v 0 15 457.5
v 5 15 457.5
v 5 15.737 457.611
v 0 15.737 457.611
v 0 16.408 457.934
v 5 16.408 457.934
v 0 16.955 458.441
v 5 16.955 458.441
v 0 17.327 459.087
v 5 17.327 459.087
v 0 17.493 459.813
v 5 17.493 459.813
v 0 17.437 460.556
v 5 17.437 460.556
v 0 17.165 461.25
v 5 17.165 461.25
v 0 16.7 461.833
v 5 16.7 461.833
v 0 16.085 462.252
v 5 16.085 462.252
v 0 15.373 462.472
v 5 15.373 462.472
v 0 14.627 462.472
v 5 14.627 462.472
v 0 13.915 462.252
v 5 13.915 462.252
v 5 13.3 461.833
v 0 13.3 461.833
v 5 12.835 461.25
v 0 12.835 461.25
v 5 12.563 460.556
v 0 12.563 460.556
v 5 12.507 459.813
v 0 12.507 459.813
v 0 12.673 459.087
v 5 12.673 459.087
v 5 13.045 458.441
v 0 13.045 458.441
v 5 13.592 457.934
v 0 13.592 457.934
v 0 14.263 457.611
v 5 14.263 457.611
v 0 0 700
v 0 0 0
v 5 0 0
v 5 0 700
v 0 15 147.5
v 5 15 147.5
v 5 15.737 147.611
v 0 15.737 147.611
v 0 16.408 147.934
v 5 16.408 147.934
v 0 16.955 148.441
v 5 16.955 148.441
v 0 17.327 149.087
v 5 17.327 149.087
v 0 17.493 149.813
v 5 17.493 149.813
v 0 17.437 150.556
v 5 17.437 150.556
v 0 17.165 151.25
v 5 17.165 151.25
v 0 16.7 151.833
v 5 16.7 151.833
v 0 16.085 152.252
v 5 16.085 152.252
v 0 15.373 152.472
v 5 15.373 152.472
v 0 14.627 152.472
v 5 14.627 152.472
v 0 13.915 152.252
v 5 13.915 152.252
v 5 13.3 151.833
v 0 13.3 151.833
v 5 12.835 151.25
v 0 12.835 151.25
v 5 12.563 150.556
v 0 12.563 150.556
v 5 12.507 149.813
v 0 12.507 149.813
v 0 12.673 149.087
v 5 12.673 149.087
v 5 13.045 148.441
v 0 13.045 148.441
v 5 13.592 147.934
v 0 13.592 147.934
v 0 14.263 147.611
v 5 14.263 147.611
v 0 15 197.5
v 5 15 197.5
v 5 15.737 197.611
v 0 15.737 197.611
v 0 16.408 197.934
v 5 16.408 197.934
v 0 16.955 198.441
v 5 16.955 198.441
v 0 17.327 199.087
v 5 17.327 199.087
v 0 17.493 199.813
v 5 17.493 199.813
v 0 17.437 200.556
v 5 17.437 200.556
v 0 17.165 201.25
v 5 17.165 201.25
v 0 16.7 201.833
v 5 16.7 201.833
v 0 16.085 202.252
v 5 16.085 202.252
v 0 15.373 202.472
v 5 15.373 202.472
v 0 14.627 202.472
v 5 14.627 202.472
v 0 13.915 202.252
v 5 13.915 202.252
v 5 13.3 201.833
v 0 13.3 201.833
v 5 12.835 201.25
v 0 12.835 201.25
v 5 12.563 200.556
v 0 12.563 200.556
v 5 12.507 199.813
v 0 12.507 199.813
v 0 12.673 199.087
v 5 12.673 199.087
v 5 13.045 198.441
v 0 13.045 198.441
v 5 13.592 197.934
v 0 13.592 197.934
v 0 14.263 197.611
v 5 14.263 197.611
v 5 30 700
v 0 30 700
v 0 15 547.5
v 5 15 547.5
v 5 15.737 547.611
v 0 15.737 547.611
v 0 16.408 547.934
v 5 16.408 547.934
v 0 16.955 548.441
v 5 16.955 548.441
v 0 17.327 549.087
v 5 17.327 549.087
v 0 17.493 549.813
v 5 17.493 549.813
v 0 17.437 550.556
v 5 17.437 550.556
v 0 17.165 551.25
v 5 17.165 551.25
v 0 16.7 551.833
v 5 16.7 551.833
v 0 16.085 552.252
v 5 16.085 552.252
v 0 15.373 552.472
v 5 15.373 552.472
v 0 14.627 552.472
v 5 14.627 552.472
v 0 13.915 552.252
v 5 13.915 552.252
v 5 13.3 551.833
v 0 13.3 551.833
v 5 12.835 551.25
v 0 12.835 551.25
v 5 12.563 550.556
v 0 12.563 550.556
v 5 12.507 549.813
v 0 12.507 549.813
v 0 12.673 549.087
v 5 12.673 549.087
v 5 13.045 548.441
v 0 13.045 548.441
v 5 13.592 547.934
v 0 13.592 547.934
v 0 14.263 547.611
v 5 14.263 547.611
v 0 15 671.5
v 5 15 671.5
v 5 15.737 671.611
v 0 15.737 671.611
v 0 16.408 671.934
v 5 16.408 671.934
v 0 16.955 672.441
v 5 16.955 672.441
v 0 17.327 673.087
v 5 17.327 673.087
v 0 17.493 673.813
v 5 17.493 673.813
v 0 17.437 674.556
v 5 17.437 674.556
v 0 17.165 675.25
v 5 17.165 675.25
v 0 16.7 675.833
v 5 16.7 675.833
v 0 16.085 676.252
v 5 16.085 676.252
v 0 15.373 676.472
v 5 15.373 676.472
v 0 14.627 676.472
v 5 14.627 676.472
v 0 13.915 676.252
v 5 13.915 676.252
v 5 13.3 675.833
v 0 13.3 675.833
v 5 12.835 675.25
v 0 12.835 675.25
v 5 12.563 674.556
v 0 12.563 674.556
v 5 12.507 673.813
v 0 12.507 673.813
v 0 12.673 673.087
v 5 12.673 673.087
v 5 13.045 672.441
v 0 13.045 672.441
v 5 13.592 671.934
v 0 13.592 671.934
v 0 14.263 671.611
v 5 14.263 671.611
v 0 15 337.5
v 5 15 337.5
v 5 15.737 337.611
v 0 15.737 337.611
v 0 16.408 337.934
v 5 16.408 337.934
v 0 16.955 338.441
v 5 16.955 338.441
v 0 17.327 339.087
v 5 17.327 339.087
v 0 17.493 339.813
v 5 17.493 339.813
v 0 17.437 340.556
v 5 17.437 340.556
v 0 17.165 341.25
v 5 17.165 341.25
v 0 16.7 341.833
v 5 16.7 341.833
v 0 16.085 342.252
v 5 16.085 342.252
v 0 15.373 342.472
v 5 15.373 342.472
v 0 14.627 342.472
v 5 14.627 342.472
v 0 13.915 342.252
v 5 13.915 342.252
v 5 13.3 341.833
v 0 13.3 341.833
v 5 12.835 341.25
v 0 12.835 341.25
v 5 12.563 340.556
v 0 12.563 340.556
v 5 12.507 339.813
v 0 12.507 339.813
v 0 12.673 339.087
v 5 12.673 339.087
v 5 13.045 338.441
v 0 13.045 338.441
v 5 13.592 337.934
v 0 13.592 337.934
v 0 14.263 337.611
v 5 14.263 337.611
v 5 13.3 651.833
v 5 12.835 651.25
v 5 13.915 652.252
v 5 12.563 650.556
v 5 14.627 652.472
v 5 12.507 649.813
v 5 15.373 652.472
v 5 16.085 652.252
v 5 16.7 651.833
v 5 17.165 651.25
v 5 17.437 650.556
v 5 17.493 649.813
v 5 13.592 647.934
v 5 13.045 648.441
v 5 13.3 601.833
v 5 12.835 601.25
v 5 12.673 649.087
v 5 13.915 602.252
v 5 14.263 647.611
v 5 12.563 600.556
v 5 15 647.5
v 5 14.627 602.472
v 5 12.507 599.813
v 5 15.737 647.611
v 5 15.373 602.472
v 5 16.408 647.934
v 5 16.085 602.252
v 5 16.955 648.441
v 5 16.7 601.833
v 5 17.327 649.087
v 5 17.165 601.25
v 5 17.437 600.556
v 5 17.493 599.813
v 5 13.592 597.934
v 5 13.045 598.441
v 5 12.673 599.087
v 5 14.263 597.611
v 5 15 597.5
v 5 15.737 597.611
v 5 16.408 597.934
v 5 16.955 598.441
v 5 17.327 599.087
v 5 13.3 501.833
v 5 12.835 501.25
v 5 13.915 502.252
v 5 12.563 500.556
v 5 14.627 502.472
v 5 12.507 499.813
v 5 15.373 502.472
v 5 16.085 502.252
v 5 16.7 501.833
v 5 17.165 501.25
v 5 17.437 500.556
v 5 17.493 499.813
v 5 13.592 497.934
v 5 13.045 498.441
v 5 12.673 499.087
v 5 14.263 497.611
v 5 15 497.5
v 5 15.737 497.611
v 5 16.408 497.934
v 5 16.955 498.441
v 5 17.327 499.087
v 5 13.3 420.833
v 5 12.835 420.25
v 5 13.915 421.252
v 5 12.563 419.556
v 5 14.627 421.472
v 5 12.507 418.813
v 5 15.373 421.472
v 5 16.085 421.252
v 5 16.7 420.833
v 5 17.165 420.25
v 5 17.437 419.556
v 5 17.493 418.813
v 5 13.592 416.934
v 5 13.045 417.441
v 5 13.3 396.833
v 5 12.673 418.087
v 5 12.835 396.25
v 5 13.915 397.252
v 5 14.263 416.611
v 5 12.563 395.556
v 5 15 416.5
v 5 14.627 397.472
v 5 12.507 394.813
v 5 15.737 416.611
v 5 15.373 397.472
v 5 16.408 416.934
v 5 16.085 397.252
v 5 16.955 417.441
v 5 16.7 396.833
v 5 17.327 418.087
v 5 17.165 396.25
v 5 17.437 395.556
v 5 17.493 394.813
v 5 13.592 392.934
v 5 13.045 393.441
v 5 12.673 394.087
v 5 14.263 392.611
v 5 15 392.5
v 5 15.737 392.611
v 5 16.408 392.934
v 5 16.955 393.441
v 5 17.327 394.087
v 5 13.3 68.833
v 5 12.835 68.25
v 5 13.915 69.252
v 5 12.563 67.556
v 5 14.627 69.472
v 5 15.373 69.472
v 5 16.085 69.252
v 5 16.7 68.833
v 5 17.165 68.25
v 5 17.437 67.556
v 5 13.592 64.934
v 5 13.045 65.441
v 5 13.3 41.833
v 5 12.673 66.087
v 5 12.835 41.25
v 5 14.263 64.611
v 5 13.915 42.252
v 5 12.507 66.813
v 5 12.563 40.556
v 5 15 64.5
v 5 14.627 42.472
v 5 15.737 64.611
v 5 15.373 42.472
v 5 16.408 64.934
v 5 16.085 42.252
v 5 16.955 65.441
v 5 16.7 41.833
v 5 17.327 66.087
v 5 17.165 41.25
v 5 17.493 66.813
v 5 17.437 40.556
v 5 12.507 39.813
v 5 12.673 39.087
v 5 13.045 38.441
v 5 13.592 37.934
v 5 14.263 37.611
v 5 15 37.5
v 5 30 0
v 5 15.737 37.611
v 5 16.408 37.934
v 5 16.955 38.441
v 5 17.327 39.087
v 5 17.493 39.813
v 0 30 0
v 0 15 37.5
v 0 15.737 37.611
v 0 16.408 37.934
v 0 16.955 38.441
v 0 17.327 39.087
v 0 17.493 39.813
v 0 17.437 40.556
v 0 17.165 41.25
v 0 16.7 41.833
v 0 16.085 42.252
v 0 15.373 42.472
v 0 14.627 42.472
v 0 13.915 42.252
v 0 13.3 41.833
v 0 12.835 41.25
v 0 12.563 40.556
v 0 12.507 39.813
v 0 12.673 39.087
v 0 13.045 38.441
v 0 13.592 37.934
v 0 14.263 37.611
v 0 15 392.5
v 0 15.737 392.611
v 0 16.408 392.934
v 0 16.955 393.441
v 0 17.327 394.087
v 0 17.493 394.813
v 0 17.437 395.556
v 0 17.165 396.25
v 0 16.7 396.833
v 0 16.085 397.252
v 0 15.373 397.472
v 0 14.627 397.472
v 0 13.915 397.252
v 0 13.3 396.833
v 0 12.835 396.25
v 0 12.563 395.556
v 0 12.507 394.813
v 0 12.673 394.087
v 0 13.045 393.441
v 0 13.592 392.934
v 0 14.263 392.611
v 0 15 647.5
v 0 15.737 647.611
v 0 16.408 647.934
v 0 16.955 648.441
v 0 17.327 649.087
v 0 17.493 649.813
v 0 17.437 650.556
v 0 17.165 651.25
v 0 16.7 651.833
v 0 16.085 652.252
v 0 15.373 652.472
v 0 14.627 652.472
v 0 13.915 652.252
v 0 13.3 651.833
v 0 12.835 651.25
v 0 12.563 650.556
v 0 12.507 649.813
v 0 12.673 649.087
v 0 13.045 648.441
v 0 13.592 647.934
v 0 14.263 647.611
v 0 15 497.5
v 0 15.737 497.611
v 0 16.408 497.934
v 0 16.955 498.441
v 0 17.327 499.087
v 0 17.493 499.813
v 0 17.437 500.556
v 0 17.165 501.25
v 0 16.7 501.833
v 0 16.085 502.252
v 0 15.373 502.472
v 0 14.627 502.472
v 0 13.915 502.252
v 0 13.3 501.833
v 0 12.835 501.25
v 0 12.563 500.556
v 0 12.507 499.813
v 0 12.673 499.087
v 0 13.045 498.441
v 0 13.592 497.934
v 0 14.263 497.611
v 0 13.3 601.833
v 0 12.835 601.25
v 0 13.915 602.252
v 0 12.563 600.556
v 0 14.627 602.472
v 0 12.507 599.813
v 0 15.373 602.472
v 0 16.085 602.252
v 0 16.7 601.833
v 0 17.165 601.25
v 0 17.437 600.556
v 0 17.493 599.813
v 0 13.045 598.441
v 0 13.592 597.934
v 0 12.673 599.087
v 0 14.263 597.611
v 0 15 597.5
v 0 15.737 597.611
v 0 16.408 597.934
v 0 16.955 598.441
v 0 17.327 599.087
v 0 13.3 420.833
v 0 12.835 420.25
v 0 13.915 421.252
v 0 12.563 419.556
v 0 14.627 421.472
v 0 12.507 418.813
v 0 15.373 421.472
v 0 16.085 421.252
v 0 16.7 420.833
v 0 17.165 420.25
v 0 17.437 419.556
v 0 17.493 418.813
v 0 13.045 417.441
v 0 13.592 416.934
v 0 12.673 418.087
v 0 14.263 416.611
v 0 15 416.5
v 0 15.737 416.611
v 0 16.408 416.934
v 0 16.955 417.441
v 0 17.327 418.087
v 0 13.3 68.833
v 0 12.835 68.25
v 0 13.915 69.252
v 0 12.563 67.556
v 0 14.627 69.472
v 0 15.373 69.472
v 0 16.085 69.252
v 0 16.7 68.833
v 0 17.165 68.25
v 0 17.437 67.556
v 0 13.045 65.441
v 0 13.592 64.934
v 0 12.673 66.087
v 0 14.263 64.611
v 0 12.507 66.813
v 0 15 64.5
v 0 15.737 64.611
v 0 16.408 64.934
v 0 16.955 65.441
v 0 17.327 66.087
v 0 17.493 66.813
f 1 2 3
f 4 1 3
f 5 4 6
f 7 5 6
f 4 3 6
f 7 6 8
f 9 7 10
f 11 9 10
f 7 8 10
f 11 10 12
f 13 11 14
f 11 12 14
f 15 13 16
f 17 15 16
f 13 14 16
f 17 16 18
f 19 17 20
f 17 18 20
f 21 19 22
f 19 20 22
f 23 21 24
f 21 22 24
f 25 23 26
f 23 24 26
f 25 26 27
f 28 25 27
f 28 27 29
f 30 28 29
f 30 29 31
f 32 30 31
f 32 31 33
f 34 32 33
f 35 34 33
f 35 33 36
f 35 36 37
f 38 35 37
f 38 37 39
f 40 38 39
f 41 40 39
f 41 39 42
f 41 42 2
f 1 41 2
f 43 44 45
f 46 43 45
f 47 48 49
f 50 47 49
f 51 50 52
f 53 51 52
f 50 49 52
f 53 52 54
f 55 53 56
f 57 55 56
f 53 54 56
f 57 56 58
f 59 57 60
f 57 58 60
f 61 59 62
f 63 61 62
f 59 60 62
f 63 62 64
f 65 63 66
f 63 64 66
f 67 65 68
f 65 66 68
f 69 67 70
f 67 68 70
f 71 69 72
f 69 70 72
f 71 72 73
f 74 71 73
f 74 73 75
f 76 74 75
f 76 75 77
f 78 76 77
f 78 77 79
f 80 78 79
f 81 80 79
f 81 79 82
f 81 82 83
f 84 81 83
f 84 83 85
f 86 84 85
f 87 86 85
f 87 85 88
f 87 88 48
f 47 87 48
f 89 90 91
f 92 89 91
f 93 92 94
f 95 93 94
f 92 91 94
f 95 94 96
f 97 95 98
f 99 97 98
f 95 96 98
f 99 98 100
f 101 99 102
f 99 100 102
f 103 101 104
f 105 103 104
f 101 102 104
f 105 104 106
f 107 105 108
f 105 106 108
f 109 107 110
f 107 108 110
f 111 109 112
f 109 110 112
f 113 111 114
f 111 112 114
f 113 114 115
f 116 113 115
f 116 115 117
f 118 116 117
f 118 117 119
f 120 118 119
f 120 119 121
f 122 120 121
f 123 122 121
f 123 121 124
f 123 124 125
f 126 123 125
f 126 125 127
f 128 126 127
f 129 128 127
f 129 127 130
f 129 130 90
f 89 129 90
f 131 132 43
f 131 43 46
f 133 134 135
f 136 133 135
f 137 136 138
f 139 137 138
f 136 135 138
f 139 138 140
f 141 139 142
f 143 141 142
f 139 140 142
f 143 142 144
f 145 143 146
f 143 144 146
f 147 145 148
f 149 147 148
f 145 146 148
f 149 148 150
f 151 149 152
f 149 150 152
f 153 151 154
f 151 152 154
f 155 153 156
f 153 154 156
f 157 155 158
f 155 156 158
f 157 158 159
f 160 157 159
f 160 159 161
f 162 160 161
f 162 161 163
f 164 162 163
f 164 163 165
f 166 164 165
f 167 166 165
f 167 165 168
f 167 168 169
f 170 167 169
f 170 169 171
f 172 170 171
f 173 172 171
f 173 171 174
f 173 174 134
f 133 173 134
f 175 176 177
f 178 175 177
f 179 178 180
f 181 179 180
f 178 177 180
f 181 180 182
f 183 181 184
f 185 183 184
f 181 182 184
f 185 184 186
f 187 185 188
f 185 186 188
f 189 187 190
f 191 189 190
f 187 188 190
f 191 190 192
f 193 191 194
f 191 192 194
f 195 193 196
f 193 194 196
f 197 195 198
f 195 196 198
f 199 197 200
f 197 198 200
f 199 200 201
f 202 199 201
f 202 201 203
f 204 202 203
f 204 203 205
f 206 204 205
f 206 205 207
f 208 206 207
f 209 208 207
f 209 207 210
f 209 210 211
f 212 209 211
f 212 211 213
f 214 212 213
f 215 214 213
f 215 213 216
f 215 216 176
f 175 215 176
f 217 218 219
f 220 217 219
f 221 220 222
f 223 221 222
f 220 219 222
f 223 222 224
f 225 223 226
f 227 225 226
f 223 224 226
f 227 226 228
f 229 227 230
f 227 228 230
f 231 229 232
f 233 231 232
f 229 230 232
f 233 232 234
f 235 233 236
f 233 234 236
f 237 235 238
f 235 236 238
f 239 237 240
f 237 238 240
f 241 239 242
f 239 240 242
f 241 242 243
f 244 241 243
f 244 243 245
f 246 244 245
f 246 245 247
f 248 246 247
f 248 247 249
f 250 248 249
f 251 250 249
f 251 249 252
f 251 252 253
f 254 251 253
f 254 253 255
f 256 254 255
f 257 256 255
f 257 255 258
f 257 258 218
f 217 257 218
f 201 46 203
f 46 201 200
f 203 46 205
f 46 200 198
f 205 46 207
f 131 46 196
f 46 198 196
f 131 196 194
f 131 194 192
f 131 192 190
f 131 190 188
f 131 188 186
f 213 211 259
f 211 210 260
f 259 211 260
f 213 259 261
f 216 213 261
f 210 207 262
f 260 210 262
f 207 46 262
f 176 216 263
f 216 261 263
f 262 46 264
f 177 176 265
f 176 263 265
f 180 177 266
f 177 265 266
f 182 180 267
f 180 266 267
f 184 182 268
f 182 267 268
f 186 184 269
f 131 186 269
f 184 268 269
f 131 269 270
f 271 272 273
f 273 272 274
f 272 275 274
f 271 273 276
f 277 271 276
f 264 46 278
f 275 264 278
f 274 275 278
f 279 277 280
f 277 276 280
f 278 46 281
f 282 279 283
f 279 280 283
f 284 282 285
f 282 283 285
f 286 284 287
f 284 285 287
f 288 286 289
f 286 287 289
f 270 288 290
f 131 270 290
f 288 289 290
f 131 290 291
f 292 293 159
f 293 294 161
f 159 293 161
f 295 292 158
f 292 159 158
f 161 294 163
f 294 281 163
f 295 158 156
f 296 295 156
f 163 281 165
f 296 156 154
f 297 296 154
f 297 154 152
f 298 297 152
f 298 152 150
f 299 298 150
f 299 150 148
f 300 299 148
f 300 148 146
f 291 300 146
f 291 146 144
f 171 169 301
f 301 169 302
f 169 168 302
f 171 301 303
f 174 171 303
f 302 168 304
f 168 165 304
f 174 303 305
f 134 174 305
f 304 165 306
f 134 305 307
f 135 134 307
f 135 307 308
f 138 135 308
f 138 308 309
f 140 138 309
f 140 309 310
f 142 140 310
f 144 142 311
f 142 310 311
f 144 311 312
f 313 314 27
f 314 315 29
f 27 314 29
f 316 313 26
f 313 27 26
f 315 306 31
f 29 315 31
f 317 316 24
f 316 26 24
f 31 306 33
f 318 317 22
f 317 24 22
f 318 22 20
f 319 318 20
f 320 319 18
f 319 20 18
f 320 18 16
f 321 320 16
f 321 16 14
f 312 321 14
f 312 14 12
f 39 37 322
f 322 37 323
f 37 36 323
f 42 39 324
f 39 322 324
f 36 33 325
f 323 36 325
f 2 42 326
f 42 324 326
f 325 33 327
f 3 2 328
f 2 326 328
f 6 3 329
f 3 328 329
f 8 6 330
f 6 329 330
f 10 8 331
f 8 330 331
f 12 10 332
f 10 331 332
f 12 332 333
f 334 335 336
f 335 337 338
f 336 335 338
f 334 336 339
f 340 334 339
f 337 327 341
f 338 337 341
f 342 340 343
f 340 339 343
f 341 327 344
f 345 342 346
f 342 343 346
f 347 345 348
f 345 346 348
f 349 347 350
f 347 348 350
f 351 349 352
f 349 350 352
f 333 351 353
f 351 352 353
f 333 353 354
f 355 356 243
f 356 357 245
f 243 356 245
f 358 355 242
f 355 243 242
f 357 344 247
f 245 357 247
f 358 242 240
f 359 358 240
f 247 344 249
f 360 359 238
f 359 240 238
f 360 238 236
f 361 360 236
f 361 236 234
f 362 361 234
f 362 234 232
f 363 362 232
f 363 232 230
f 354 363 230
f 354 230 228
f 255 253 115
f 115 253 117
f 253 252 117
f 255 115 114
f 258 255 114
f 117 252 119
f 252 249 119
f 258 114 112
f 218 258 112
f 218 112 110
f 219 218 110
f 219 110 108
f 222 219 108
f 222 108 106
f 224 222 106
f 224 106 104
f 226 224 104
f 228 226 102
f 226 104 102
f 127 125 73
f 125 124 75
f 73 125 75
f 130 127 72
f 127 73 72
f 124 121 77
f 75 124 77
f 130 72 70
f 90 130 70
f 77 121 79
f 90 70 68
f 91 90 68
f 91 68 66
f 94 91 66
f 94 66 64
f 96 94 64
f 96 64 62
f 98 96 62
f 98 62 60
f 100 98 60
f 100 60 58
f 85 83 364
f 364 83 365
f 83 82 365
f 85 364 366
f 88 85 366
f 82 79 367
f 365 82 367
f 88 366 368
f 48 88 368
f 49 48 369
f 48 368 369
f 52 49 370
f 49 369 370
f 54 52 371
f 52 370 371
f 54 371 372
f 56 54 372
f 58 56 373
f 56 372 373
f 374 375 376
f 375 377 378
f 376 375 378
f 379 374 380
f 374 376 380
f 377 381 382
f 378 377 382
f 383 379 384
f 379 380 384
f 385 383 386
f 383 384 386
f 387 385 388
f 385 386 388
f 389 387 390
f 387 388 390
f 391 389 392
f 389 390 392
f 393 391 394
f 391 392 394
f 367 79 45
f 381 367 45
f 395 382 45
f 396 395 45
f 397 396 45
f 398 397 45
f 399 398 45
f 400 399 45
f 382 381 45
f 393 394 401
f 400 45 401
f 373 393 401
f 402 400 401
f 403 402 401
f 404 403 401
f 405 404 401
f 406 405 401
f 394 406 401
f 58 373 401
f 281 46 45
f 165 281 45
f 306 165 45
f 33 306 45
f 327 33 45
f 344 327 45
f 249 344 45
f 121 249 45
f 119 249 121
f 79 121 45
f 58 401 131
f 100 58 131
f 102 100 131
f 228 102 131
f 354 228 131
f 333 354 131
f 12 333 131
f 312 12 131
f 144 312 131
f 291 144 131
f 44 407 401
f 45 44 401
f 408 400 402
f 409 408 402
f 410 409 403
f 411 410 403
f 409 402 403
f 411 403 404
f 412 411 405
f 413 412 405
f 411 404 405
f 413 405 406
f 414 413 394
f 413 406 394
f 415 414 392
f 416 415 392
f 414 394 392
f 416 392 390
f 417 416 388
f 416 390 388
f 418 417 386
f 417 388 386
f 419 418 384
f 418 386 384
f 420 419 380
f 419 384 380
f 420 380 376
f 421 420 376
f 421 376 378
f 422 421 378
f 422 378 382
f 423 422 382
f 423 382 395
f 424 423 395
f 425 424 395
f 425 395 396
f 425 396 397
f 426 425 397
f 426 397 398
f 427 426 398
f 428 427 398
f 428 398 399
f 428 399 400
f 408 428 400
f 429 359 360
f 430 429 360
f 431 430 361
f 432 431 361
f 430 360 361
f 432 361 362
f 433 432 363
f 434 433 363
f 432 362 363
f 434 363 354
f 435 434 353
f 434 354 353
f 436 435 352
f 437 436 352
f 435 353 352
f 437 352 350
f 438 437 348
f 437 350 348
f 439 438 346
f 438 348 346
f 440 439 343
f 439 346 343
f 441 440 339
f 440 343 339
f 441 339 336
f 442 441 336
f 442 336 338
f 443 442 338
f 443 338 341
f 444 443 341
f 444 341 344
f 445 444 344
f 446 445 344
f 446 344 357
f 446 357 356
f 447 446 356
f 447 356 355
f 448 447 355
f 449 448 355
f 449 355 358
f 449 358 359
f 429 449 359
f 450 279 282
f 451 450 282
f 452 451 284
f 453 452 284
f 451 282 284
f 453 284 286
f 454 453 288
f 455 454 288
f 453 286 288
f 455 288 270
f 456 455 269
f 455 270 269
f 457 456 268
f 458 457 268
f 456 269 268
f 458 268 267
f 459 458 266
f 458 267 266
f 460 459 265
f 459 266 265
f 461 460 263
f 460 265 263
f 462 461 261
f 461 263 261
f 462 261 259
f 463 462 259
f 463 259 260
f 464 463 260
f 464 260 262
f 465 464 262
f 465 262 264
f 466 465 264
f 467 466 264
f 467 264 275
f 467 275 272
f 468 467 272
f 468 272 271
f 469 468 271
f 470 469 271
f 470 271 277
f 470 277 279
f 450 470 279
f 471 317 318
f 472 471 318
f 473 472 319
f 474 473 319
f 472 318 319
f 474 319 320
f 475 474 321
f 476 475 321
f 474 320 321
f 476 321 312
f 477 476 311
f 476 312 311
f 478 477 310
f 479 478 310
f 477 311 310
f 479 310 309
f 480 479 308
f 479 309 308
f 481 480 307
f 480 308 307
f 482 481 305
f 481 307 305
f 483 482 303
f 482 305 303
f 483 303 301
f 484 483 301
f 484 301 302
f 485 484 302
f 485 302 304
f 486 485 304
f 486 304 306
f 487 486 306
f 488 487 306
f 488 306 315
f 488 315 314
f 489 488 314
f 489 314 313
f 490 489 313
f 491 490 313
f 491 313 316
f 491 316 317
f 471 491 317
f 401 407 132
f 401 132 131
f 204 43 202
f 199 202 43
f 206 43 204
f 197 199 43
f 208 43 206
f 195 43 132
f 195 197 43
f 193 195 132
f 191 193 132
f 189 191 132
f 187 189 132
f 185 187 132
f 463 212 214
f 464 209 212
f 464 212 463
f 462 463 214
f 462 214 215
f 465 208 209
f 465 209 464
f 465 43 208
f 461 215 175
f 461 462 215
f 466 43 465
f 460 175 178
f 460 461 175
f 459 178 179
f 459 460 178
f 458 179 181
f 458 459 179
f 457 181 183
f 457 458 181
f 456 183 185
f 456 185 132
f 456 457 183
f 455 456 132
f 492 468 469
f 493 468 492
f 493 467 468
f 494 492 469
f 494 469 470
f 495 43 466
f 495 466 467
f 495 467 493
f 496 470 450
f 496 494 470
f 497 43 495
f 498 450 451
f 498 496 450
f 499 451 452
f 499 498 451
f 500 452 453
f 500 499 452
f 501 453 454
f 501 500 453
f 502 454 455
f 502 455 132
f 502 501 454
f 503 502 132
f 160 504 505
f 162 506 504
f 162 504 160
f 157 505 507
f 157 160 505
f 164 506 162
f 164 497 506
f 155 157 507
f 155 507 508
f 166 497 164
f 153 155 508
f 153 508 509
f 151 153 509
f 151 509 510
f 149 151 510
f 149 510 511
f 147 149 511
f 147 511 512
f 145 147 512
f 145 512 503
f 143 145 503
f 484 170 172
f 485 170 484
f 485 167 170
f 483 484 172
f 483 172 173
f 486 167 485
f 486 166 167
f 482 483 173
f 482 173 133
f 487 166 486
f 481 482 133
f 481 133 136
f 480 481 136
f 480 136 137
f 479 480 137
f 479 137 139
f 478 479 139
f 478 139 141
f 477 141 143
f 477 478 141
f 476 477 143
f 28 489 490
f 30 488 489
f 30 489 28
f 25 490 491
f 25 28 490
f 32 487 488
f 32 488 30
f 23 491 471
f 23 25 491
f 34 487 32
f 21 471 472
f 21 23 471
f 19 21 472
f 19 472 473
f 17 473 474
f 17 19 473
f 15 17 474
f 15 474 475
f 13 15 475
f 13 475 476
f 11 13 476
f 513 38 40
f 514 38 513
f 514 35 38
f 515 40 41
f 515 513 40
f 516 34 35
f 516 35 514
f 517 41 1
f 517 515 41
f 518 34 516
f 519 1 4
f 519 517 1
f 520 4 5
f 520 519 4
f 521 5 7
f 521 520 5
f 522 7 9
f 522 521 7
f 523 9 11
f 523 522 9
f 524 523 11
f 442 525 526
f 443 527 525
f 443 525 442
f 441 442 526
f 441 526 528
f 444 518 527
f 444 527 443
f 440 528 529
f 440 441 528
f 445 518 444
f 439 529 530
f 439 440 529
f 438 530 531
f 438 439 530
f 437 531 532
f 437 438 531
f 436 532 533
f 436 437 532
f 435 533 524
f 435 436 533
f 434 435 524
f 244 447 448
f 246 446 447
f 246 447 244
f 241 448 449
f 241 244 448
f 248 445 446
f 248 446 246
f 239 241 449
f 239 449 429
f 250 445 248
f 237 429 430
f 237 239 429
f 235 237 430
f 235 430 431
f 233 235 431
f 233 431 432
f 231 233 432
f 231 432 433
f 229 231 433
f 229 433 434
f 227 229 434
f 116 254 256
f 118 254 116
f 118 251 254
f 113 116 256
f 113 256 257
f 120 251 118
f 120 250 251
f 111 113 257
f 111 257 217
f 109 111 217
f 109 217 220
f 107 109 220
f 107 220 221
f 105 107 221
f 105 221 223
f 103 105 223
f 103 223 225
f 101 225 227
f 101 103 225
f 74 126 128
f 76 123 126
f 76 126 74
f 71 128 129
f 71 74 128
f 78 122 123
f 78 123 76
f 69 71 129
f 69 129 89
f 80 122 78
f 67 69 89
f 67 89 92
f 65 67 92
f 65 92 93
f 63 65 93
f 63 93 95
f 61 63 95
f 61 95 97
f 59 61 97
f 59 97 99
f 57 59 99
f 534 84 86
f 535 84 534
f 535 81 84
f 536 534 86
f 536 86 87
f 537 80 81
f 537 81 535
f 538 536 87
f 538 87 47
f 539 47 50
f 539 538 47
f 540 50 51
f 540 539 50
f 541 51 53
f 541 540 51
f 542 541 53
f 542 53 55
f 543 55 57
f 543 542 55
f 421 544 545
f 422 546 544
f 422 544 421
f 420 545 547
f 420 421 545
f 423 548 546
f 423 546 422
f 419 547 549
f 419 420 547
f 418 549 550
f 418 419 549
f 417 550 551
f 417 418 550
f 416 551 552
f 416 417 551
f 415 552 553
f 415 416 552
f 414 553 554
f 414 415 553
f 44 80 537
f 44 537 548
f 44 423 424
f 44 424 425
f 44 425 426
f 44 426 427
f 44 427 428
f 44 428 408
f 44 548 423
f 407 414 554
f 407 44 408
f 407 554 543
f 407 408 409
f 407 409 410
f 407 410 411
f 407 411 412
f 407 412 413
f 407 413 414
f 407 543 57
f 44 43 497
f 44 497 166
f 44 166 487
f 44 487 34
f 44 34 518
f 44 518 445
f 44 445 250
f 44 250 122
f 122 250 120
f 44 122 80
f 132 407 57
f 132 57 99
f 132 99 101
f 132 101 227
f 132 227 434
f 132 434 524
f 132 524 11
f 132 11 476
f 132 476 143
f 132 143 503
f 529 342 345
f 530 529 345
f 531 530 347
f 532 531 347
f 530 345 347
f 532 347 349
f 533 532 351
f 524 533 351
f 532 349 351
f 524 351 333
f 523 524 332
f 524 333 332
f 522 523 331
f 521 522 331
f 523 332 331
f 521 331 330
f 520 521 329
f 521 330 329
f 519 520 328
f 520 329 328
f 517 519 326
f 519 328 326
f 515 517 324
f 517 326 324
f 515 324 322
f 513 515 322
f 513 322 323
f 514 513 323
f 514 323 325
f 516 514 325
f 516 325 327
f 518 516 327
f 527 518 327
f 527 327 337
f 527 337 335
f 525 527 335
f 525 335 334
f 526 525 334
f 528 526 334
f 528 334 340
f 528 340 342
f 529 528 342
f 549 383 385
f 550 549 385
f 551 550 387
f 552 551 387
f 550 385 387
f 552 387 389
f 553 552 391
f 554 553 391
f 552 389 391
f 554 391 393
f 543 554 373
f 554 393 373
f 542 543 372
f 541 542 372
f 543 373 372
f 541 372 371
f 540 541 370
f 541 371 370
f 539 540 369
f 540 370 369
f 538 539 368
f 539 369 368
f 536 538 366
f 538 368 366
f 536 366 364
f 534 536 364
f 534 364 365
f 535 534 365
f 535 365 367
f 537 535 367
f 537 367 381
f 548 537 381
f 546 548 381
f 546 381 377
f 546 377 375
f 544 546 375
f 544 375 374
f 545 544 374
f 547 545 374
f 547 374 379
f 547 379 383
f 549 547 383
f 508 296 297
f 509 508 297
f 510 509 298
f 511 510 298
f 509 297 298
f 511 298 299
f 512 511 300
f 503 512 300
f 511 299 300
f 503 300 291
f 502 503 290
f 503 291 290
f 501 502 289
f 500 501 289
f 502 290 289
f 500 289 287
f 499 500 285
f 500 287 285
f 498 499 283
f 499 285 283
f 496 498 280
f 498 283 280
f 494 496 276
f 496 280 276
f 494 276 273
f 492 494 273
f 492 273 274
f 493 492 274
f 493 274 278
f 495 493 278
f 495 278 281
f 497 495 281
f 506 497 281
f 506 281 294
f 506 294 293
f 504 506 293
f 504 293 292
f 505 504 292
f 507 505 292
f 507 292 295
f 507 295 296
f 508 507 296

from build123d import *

# Parameters (mm, degrees)
SKETCH1_W           = 5
SKETCH1_H           = 30
BOSS_EXTRUDE1_DEPTH = 700
SKETCH2_R           = 2.5
CUT_EXTRUDE1_DEPTH  = 701.660402763


with BuildPart() as part:
    # Sketch1 → Boss-Extrude1 (new body)
    with BuildSketch(Plane.XY):
        with Locations((2.5, 15)):
            Rectangle(SKETCH1_W, SKETCH1_H)
    extrude(amount=BOSS_EXTRUDE1_DEPTH)

    # Sketch2 → Cut-Extrude1 (cut, through all)
    with BuildSketch(Plane(origin=(5, 0, 0), x_dir=(0, 0, -1), z_dir=(1, 0, 0))):
        with Locations((-674, 15)):
            Circle(SKETCH2_R)
        with Locations((-600, 15)):
            Circle(SKETCH2_R)
        with Locations((-500, 15)):
            Circle(SKETCH2_R)
        with Locations((-550, 15)):
            Circle(SKETCH2_R)
        with Locations((-460, 15)):
            Circle(SKETCH2_R)
        with Locations((-419, 15)):
            Circle(SKETCH2_R)
        with Locations((-395, 15)):
            Circle(SKETCH2_R)
        with Locations((-340, 15)):
            Circle(SKETCH2_R)
        with Locations((-200, 15)):
            Circle(SKETCH2_R)
        with Locations((-650, 15)):
            Circle(SKETCH2_R)
        with Locations((-150, 15)):
            Circle(SKETCH2_R)
        with Locations((-67, 15)):
            Circle(SKETCH2_R)
        with Locations((-40, 15)):
            Circle(SKETCH2_R)
    extrude(amount=-CUT_EXTRUDE1_DEPTH, mode=Mode.SUBTRACT)


solid = part.part
